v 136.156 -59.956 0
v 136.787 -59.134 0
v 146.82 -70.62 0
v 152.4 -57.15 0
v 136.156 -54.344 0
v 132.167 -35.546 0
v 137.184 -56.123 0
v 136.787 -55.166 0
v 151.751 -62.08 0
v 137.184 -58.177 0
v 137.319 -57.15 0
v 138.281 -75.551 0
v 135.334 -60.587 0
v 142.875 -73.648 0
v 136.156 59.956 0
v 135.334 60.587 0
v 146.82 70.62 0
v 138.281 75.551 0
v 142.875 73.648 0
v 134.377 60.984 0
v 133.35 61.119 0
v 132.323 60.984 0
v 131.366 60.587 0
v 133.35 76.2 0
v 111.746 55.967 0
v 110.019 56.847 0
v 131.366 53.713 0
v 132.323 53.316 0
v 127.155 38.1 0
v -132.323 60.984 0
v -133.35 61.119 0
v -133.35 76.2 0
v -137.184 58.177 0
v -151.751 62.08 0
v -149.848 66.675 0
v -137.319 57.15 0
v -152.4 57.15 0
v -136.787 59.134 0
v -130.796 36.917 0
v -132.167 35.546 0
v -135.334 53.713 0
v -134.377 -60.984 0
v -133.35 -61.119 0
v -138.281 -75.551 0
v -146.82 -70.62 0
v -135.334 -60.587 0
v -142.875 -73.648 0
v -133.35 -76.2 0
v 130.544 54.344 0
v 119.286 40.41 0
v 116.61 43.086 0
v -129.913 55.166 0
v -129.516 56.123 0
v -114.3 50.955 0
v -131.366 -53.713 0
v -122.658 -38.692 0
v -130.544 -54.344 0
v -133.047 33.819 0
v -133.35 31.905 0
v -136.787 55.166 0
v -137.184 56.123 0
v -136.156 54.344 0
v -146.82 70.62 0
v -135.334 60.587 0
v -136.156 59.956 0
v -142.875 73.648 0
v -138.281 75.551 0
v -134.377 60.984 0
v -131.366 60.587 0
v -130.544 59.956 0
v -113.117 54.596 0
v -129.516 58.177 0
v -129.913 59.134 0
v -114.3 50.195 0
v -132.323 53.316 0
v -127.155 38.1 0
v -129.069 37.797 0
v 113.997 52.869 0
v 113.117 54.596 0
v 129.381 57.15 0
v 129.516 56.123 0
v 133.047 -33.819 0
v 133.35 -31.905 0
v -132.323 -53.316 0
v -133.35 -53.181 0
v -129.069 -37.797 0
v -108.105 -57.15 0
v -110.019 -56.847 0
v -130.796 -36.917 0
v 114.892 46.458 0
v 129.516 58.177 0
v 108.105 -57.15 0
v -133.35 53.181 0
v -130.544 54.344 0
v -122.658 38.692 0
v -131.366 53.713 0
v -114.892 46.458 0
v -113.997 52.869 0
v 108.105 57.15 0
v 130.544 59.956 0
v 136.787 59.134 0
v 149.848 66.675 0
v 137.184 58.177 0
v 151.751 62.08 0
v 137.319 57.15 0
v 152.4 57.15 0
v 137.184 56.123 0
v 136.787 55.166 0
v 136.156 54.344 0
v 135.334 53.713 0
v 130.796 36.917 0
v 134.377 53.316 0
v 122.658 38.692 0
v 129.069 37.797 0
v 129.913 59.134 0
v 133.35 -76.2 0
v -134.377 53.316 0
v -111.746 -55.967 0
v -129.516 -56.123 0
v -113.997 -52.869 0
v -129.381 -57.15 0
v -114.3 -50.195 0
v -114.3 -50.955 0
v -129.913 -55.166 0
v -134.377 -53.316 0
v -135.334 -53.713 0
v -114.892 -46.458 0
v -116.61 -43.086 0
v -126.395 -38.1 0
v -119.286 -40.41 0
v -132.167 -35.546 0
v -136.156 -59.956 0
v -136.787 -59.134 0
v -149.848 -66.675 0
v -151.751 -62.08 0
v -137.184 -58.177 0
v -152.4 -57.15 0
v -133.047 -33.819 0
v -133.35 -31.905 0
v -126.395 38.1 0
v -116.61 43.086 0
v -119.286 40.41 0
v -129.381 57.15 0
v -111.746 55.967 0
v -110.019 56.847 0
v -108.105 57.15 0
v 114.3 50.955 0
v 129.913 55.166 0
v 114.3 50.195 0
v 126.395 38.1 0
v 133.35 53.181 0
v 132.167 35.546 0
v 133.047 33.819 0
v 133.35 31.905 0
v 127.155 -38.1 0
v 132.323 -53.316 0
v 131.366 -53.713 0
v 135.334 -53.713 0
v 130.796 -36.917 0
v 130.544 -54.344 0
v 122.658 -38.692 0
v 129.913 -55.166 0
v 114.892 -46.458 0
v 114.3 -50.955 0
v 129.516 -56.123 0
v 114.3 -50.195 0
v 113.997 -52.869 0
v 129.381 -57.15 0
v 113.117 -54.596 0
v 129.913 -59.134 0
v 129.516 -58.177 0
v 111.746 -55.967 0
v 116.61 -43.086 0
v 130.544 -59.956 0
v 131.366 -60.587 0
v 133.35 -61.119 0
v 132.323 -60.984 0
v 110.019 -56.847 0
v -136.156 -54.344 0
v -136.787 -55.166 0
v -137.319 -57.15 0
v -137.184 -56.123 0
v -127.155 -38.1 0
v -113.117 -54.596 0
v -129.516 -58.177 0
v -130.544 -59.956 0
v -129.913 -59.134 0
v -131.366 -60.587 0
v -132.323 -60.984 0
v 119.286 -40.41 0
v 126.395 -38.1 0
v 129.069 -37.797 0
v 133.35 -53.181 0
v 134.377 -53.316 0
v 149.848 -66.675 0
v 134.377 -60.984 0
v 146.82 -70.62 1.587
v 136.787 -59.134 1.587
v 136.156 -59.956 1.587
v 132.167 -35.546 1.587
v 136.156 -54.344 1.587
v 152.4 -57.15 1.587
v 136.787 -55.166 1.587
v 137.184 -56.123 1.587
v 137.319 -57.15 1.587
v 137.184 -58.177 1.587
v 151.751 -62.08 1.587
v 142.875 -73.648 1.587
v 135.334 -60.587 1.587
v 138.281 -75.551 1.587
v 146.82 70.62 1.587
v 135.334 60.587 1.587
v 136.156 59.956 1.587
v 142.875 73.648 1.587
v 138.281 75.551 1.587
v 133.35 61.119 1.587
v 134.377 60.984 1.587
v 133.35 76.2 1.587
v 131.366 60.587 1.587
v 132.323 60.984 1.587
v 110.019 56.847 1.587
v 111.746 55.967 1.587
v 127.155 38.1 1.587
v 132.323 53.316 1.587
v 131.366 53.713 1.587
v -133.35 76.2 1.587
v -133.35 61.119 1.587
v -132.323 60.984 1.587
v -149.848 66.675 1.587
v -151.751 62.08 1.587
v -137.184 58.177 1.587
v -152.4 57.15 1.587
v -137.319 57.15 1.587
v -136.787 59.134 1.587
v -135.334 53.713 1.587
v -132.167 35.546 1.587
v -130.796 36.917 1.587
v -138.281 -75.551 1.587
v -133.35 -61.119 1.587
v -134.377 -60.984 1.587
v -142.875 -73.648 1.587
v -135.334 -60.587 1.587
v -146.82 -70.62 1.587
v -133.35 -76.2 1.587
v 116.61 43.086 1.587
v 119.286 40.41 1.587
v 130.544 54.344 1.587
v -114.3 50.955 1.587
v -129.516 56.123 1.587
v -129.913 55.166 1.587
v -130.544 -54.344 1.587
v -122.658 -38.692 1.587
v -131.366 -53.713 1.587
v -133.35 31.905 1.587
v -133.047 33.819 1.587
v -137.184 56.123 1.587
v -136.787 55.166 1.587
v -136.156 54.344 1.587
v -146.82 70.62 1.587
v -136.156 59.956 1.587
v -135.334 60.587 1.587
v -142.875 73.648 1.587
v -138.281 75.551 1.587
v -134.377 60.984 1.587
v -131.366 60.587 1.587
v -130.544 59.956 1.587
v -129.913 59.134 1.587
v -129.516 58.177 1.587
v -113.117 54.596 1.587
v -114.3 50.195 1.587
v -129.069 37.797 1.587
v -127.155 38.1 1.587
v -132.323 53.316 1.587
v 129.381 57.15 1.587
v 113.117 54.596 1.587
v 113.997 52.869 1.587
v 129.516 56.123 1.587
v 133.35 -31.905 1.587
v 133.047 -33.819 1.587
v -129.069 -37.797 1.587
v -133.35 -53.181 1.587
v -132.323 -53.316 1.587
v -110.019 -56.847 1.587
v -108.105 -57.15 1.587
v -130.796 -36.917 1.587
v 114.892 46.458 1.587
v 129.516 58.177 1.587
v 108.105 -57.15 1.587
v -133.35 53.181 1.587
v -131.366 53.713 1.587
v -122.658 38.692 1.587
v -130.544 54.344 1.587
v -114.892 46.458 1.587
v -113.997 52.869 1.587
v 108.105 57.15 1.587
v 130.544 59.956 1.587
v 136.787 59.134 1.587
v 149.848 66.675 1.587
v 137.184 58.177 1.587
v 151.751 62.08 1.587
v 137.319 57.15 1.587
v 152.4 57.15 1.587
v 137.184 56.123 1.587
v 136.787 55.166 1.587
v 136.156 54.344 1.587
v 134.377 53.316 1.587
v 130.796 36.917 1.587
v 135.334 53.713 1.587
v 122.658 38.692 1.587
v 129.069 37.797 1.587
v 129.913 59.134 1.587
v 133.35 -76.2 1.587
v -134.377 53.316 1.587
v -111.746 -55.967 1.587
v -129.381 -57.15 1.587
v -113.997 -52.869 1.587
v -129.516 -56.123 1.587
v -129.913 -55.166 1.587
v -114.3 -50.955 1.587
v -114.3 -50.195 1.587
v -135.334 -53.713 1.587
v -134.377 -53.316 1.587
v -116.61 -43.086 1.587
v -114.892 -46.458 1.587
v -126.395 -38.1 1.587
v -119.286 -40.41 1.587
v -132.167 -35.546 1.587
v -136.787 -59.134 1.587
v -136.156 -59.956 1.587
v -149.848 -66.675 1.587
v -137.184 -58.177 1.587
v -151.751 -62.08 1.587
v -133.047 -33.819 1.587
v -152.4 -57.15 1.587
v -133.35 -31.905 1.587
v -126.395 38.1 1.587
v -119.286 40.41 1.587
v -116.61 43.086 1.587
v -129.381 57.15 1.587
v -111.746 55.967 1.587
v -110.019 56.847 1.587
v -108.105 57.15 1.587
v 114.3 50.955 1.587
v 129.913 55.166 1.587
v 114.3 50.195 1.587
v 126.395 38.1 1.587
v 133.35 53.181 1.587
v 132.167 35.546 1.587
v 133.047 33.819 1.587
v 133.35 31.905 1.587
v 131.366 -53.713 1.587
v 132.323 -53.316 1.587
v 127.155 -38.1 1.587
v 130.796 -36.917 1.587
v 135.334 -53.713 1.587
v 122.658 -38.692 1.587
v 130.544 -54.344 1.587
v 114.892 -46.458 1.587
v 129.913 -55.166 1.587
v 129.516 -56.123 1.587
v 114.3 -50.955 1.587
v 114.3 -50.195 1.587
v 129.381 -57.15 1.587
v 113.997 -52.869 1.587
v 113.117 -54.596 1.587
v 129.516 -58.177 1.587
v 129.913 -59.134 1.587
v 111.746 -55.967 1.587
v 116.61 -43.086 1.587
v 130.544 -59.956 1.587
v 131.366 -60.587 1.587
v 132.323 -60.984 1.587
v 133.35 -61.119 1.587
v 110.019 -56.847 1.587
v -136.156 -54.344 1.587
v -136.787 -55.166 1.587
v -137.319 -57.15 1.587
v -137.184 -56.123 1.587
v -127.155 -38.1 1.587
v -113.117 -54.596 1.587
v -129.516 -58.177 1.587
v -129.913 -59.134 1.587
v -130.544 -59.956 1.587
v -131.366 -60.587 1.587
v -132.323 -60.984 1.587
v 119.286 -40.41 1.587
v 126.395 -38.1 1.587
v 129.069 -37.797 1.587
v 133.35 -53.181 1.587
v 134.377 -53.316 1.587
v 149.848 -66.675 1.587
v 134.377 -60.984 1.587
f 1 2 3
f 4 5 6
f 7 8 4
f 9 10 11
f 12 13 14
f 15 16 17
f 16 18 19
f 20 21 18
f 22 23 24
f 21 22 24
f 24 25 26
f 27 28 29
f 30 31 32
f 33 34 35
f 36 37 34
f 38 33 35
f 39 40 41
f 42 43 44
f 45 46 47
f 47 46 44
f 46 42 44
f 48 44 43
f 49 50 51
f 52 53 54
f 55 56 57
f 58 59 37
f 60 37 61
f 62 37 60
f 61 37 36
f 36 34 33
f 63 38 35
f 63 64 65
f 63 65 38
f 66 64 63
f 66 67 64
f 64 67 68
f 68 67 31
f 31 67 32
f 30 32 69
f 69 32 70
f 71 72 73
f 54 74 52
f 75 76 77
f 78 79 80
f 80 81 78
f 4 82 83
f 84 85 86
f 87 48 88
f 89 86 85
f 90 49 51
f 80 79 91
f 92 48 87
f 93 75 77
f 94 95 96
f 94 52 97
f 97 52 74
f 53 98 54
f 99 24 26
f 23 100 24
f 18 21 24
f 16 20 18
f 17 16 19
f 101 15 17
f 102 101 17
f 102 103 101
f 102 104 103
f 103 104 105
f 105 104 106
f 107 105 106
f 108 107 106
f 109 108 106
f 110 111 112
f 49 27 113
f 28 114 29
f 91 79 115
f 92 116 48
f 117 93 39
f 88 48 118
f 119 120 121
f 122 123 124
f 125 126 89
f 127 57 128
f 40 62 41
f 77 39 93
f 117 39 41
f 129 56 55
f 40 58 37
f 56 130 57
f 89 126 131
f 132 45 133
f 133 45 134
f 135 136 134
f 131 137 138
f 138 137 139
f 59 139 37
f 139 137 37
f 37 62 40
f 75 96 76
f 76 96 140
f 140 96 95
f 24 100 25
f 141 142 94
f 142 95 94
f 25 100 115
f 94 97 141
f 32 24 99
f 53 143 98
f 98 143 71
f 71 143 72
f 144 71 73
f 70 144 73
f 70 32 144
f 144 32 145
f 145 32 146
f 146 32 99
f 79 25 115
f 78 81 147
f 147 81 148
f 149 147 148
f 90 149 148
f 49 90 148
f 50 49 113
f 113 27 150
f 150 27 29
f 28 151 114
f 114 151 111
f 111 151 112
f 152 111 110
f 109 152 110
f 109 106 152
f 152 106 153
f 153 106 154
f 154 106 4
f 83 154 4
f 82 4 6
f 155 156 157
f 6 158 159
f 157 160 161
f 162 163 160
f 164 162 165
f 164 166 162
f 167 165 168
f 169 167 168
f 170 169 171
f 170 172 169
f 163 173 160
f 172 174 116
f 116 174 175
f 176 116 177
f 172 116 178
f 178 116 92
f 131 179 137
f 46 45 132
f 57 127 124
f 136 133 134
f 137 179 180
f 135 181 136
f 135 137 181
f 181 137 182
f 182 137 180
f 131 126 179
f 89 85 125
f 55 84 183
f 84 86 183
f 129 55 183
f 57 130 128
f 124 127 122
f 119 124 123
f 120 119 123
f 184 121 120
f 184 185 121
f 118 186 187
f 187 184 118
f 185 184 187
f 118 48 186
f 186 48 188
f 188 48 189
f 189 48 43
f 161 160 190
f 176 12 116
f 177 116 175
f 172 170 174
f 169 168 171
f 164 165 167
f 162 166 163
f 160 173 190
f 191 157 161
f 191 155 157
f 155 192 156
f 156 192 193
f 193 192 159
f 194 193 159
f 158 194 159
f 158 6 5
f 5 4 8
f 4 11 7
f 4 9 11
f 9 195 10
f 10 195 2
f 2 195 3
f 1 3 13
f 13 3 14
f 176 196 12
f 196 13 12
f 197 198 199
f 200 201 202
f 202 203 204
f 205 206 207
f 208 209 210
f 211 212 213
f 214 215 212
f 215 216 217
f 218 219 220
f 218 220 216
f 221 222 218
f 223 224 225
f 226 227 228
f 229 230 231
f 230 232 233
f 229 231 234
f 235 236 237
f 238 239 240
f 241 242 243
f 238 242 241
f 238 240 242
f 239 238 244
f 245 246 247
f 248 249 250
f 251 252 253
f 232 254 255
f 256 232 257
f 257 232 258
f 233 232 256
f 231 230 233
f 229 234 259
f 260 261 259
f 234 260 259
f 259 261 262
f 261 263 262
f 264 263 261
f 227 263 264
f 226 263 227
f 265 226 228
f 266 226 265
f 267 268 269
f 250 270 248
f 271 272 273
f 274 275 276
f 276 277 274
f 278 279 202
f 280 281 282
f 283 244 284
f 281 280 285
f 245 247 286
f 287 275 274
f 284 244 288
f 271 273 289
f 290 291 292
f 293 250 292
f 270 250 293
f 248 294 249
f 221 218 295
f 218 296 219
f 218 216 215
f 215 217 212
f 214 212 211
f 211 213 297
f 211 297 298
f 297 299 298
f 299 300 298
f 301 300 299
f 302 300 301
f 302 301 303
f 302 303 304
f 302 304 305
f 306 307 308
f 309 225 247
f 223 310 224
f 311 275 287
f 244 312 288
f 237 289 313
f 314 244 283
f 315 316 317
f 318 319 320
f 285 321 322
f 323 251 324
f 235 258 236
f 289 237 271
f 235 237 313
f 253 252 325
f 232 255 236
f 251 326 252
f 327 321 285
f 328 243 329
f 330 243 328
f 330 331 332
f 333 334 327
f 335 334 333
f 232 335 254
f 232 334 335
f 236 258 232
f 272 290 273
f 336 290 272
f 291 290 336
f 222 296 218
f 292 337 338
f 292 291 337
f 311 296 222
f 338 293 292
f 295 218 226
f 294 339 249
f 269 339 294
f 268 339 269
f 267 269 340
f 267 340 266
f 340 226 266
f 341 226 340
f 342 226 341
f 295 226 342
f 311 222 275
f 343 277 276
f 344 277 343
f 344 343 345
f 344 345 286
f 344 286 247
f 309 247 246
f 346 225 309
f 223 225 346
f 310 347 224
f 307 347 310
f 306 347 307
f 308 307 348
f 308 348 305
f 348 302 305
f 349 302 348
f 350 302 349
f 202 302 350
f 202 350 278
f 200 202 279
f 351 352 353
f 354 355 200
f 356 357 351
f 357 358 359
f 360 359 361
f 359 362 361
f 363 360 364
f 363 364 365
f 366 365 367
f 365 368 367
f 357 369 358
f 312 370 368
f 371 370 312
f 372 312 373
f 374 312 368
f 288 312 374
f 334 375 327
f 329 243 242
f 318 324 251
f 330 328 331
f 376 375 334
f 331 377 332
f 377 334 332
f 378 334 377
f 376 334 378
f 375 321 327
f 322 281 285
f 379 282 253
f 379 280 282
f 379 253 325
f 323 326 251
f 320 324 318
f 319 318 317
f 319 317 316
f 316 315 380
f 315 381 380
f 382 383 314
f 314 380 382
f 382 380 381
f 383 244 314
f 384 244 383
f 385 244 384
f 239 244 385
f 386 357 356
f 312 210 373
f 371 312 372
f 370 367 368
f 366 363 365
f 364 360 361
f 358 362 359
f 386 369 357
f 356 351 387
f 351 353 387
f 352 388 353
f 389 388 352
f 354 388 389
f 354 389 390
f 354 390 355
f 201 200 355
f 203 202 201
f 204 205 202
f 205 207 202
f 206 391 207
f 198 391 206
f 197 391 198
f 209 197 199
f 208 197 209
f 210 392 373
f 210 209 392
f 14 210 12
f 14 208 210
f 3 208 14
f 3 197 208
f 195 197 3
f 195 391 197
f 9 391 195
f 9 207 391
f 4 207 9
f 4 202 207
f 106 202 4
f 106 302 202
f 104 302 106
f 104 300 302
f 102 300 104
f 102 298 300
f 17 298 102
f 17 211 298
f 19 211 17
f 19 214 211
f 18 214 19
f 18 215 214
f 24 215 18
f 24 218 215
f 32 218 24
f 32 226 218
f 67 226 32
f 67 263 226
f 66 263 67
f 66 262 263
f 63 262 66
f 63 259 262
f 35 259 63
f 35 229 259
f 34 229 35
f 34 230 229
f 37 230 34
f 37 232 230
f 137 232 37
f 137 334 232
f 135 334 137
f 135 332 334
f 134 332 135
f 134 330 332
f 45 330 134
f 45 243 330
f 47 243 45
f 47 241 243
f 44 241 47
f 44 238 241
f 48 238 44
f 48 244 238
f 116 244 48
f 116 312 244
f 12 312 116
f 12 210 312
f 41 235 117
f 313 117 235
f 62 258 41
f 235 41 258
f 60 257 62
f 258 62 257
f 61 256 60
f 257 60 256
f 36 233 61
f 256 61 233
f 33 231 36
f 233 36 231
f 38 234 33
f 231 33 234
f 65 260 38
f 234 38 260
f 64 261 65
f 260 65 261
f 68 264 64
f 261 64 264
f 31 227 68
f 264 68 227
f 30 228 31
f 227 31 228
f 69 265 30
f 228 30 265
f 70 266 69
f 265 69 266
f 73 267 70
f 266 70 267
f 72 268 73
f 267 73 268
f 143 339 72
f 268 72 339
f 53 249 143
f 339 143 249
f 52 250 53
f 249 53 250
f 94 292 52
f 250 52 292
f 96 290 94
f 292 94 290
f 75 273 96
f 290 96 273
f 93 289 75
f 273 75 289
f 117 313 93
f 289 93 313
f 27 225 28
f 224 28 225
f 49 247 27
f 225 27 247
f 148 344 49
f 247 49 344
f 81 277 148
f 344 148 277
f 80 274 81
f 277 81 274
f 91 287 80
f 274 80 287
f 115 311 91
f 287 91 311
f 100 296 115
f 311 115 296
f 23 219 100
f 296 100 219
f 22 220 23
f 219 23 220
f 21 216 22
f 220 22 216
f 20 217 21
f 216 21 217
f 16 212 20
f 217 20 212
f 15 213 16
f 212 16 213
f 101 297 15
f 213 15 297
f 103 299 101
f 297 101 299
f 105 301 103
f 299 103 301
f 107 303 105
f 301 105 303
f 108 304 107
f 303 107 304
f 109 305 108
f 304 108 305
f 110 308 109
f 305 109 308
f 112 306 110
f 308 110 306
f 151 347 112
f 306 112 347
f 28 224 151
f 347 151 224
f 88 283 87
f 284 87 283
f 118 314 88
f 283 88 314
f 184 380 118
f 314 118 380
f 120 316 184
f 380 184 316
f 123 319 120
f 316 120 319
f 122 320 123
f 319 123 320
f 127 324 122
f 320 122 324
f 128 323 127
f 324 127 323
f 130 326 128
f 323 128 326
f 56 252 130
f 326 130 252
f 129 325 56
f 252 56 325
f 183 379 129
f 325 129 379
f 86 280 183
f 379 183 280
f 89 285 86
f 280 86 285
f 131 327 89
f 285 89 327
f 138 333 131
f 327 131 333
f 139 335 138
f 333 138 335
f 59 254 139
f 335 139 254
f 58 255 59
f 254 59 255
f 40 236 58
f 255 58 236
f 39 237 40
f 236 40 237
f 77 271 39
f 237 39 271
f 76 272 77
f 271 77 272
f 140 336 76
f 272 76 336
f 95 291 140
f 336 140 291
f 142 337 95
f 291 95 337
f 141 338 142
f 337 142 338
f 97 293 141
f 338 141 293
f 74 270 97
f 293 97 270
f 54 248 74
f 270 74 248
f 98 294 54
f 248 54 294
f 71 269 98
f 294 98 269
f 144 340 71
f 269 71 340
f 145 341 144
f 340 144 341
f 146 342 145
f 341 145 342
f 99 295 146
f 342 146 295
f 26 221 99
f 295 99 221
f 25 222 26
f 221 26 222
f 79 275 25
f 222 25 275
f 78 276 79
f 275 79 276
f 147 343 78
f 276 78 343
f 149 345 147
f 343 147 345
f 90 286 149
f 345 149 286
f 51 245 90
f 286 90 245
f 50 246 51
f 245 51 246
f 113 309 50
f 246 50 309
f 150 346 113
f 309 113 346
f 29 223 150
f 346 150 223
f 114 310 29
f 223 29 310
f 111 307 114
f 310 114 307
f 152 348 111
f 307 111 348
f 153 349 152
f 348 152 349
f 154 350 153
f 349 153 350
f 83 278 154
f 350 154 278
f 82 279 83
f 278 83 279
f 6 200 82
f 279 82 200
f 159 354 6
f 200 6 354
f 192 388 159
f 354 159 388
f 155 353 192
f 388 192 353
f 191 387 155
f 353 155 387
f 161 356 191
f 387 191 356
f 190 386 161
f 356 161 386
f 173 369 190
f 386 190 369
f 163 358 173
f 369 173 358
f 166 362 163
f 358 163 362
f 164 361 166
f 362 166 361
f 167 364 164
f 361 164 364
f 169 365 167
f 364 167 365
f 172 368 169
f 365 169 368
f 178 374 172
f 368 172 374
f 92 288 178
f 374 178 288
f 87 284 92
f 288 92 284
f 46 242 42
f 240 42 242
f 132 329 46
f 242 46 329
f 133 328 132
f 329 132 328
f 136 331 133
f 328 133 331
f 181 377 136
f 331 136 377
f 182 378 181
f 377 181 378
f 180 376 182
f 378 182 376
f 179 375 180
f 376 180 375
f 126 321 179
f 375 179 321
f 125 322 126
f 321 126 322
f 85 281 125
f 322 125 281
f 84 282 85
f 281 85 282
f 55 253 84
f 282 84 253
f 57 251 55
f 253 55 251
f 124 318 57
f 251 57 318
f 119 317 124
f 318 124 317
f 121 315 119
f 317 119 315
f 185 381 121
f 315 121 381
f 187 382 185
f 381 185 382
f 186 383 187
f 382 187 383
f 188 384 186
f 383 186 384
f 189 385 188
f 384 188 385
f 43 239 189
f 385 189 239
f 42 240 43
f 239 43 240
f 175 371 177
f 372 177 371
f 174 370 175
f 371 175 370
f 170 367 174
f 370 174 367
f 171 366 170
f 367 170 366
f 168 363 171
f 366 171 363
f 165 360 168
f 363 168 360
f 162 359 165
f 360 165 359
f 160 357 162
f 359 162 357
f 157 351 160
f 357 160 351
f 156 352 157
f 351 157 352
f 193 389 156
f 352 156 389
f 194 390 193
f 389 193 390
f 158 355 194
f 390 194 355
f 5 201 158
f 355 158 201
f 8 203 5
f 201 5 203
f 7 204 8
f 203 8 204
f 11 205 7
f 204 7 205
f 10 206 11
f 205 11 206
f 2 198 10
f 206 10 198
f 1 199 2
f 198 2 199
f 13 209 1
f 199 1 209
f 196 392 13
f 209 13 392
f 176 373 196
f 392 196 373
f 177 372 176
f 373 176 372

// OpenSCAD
// file: ../lib/TOGComplexLib1.scad
function tcplx1_multiply(a, b) =
	[a[0]*b[0] - a[1]*b[1], a[0]*b[1] + a[1]*b[0]];
function tcplx1_divide(a, b) =
	let(bot = (b[0]*b[0] + b[1]*b[1]))
	[
		(a[0]*b[0] + a[1]*b[1])/bot,
		(a[1]*b[0] - a[0]*b[1])/bot
	];

assert([-11,23] == tcplx1_multiply([3,2], [1,7]));

assert([-1,3] == tcplx1_multiply([3,1], [0,1]));
assert([-1,3] == tcplx1_multiply([0,1], [3,1]));

echo(tcplx1_divide([-1,3], [3,1]));
assert([0,1] == tcplx1_divide([-1,3], [3,1]));

function tcplx1_normalize(vec) =
	let(veclen = sqrt(vec[0]*vec[0]+vec[1]*vec[1]))
	[vec[0] / veclen, vec[1] / veclen];

function tcplx1_relative_turnvec_vv(v0, v1) =
	tcplx1_divide(tcplx1_normalize(v1), tcplx1_normalize(v0));

function tcplx1_relative_turnvec_abc(p0, p1, p2) = tcplx1_relative_turnvec_vv(p1-p0, p2-p1);

// A 90-degree turn
assert([0,1] == tcplx1_relative_turnvec_abc([0,0], [1,0], [1,1]));
assert([0,1] == tcplx1_relative_turnvec_abc([0,0], [0,1], [-1,1]));

// A 45-degree turn
assert(tcplx1_normalize([1,1]) == tcplx1_relative_turnvec_abc([0,0], [1,0], [ 2,1]));
assert(tcplx1_normalize([1,1]) == tcplx1_relative_turnvec_abc([0,0], [0,1], [-1,2]));


function tcplx1_relative_angle_abc(p0, p1, p2) =
	let(turnvec = tcplx1_relative_turnvec_abc(p0, p1, p2))
	atan2(turnvec[1], turnvec[0]);

assert(-135 == tcplx1_relative_angle_abc([0,0], [1,0], [0,-1]));
assert( -90 == tcplx1_relative_angle_abc([0,0], [1,0], [1,-1]));
assert(   0 == tcplx1_relative_angle_abc([0,0], [1,0], [2, 0]));
assert(  90 == tcplx1_relative_angle_abc([0,0], [1,0], [1, 1]));
assert( 135 == tcplx1_relative_angle_abc([0,0], [1,0], [0, 1]));

assert(  90 == tcplx1_relative_angle_abc([1,1], [3,3], [1, 5]));
// file: ../lib/TOGArrayLib1.scad
// TOGArrayLib1.5
// 
// Functions for working with arrays.
// 
// v1.1:
// - tal1_reduce assert(is_list(items)) to prevent infinite recursion
//   when given undefined or other non-list values
// v1.1.1:
// - Fix tal1_uniq_remap_v2 to return "list-remap-result" as the
//   first element of the returned list
// v1.2:
// - Add tal1_replace_at function
// v1.3:
// - tal1_is_vec_of, tal1_is_vec_of_num
// v1.4:
// - tal1_assert_for_each, for when you want to assert something
//   about each of a list of items and get nice failure messages
// v1.5:
// - Add tal1_duplicate_reversed function, which may be
//   handy when generating symmetrical polygons and stuff.

/**
 * Make a list with the contents of list `a`,
 * but starting at offset `off`, replaced by the contents of list `b`.
 * len(result) = max(len(a), off+len(b))
 */
function tal1_replace_at(a, off, b, default_value=undef, default_value_function=undef) =
	assert(is_list(a))
	assert(is_list(b))
	let( _dvf = !is_undef(default_value_function) ? default_value_function : function(i) default_value )
[
	for( i=[0:1:min(off,len(a))-1] ) a[i],
	for( i=[len(a):1:off-1] ) _dvf(i),
	for( i=[off:1:off+len(b)-1] ) b[i-off],
	for( i=[off+len(b):1:len(a)-1] ) a[i],
];

// Simplest case
assert([] == tal1_replace_at([], 0, []));
// Second simplest cases
assert(["foo"] == tal1_replace_at(["foo"], 0, []));
assert(["foo"] == tal1_replace_at([], 0, ["foo"]));
// Replace one item
assert(["foo","quux","baz"] == tal1_replace_at(["foo","bar","baz"], 1, ["quux"]));
// Replace and extend
assert(["foo","quux","tuna","tina"] == tal1_replace_at(["foo","bar","baz"], 1, ["quux", "tuna", "tina"]));
// Add beyond end of `a`
assert(["foo","zzz","quux"] == tal1_replace_at(["foo"], 2, ["quux"], default_value="zzz"));
// Adding 'nothing' should still fill to that point with defaults
assert(["foo","zzz","zzz"] == tal1_replace_at(["foo"], 3, [], default_value="zzz"));


function tal1_reduce(start, items, func, offset=0) =
	assert(is_list(items))
	len(items) == offset ? start :
	tal1_reduce(func(start, items[offset]), items, func, offset+1);

function tal1_consecutive_duplicate_count(items) = tal1_reduce(
	[0, undef],
	items,
	function(z,item) [z[0] + (item == z[1] ? 1 : 0), item]
)[0];

assert(0 == tal1_consecutive_duplicate_count([]));
assert(0 == tal1_consecutive_duplicate_count([50]));
assert(1 == tal1_consecutive_duplicate_count([50,50]));
assert(0 == tal1_consecutive_duplicate_count([50,51,52,53]));
assert(1 == tal1_consecutive_duplicate_count([50,51,52,52]));
assert(3 == tal1_consecutive_duplicate_count([50,50,50,50]));

// Set test_size to arbirarily large values
// to ensure that OpenSCAD can handle heavy recursion
let(test_size=1000) assert(test_size/2 == tal1_consecutive_duplicate_count([for(i=[0:1:test_size-1]) floor(i/2)]));



function tal1_uniq_(items, off0, off1) =
	let(chunklen = off1-off0)
	chunklen == 0 ? [] :
	chunklen == 1 ? [items[off0]] :
	let(half=floor(chunklen/2))
	let(left  = tal1_uniq_(items, off0     , off0+half))
	let(right = tal1_uniq_(items, off0+half, off1     ))
	assert(len(left) > 0)
	assert(len(right) > 0)
	left[len(left)-1] == right[0] ? [each left, for(i=[1:1:len(right)-1]) right[i]] :
	[each left, each right];

/** Given a list of items, returns a new list with identical consecutive items merged */
function tal1_uniq(items) = tal1_uniq_(items, 0, len(items));

assert([] == tal1_uniq([]));
assert([123] == tal1_uniq([123]));
assert([55,0,1,2,3] == tal1_uniq([55,0,1,2,3]));
assert([55,0,1,2] == tal1_uniq([55,0,1,1,2]));
assert([55,0,1] == tal1_uniq([55,55,0,0,0,0,0,0,1,1,1,1]));
assert([55,0] == tal1_uniq([55,0,0,0,0,0,0,0]));



/**
 * Returns [new items, old index -> new index mapping].
 * No-op version.
 */
function tal1_uniq_remap_v1(items) =
	["list-remap-result", items, [for (vi=[0:1:len(items)-1]) vi]];

// [a, a, b, b, c, c]
//
// [a,    ...], []  -> [a],[0]
// [a, a, ...], [0] -> [a],[0,0]

assert([1,2,3] == [1,2,3]);

/**
 * Recursive version that will combine adjacent identical vertexes,
 * but will use the original items.
 */
function tal1_uniq_remap_v2(items, map=[]) =
	let(index = len(map))
	len(items) == index ? ["list-remap-result", items, map] :
	index == 0 ? tal1_uniq_remap_v2(items, [0]) :
	items[index] == items[map[index-1]] ? tal1_uniq_remap_v2(items, [for(vi=map) vi, map[index-1]]) :
	tal1_uniq_remap_v2(items, [for(vi=map) vi, index]);

assert(tal1_uniq_remap_v2([1,1,2,2,3,4]) == ["list-remap-result", [1,1,2,2,3,4], [0,0,2,2,4,5]]);


/**
 * Returns true if `vec` is a list of at least min_len items
 * and component_check(each item, even those beyond min_len) is true.
 */
function tal1_is_vec_of(vec, min_len=0, component_check=function(x) true) =
	assert(is_num(min_len) && min_len >= 0)
	assert(is_function(component_check))
	is_list(vec) && len(vec) >= min_len &&
	tal1_reduce(true, vec, function(prev,item) prev && component_check(item));

function tal1_is_vec_of_num(vec, min_len=0) = tal1_is_vec_of(vec, min_len, function(i) is_num(i));

assert( true == tal1_is_vec_of_num([1,2,3]));
assert( true == tal1_is_vec_of_num([]));
assert( true == tal1_is_vec_of_num([1,2,3], 3));
assert(false == tal1_is_vec_of_num([1,2], 3));
assert(false == tal1_is_vec_of_num([1,2,"spoon"], 3));
// Requirements are ambiguous when
// first min_len items are numbers, but there are non-numeric items afterwards,
// so let's error on the side of saying 'no, it's not a list of numbers';
// i.e. the item check and the min_len are independent.
assert(false == tal1_is_vec_of_num([1,2,3,"artichoke"], 3));


/**
 * Asserts that item_checker(each item in list, index of item)[0] is true.
 * Second element of item_checker return value is assertion message.
 * Returns the original list, in case that's useful to you.
 */
function tal1_assert_for_each(list, item_checker) =
	let( _ignored = [ for(i=[0:1:len(list)-1])
		let(q=item_checker(list[i],i))
		let(passed=is_bool(q) ? q : is_list(q) ? q[0] : assert(false, str(
			"tal1_assert_for_each: item_checker should return Bool|[Bool,String], but returned ",
			q, " for item at index ", i)))
		let(message=is_list(q) ? q[1] : undef)
		assert(passed, message)
		q
	])
	list;

// Callback can return a boolean...
assert([1,2,3] == tal1_assert_for_each([1,2,3], function(v,i) is_num(v)));
// ...or a [boolean, string]
assert([1,2,3] == tal1_assert_for_each([1,2,3], function(v,i) [is_num(v), "element be a num"]));

// [a, b, c] -> [a, b, c, rxf(c), rxf(b), rxf(a)]
function tal1_duplicate_reversed(list, rxf=function(item) item) =
	[
		each list,
		for( i=[len(list)-1 : -1 : 0] ) rxf(list[i]),
	];
// file: ../lib/TOGMod1Constructors.scad
// TOGMod1Constructors-v1.11
// 
// Functions to construct objects understood by TOGMod1
// 
// v1.1:
// - Add togmod1_make_rounded_rect
// v1.2:
// - togmod1_make_rounded_rect can make ovals
// v1.3:
// - togmod1_circle_points, to just get the points of a circle
// - if pos parameter to circle function has a third element,
//   returned vertexes will include it as the z component;
// v1.3.1
// - Some assertions
// v1.4:
// - Refactor togmod1_rounded_rect_points and togmod1_circle_points
//   to use togmod1__make_nd_vector_adder for adapting to whatever
//   `pos` parameter is.
// v1.5:
// - togmod_rounded_rect_points will not simplify completely rounded sides
//   (where length of side is exactly twice the rounding radius)
//   unless simplify_rounded_sides=true
//   - This makes it more useful for polyhedron generation,
//     where radius varies, but number of points must remain constant.
// v1.6:
// - togmod1_make_rect makes a simple rectangle
// - togmod1_make_rounded_rect will defer to togmod1_make_rect when r=0
// v1.7:
// - togmod1_make_circle will return empty shape (["union"]) when d=0
// v1.8:
// - Add togmod1_text
// v1.9:
// - togmod1_circle_points uses 3 as minimum circle point count instead of 6
// v1.10:
// - Fix togmod1_linear_extrude_y so that range corresponds to Y start/end and
//   polygon X,Y correspond to X,Z.  Previously it was rotated wrongly,
//   which would have gone unnoticed for symmetrical shapes centered at 0,0.
// v1.11:
// - Remove an 'echo'

use <./TOGArrayLib1.scad>

function togmod1__make_nd_vector_adder(origin=[0,0]) =
	let(origin_is_zero = tal1_reduce(true, origin, function(prev,item) prev && item == 0))
	origin_is_zero ? (function(vec) len(vec) >= len(origin) ? vec : tal1_replace_at(origin, 0, vec)) :
	function(vec) [
		for(i=[0:1:max(len(origin),len(vec))-1]) (len(vec) > i ? vec[i] : 0) + (len(origin) > i ? origin[i] : 0),
	];

assert([1,2,3] == togmod1__make_nd_vector_adder()([1,2,3]));
assert([1,2,3] == togmod1__make_nd_vector_adder([0,0,3])([1,2]));


function togmod1_make_cuboid(size) =
	assert(is_list(size))
	assert(len(size) >= 3)
	assert(is_num(size[0]))
	assert(is_num(size[1]))
	assert(is_num(size[2]))
	["polyhedron-vf", [
		[-size[0]/2, -size[1]/2, -size[2]/2],
		[+size[0]/2, -size[1]/2, -size[2]/2],
		[-size[0]/2, +size[1]/2, -size[2]/2],
		[+size[0]/2, +size[1]/2, -size[2]/2],
		[-size[0]/2, -size[1]/2, +size[2]/2],
		[+size[0]/2, -size[1]/2, +size[2]/2],
		[-size[0]/2, +size[1]/2, +size[2]/2],
		[+size[0]/2, +size[1]/2, +size[2]/2]
	], [
		[0,1,3,2],[0,4,5,1],[4,6,7,5],[3,7,6,2],[1,5,7,3],[6,4,0,2]
	]];

function togmod1_make_polygon(verts) =
	["polygon-vp", verts, [[for( i=[0:1:len(verts)-1] ) i%len(verts)]]];

function togmod1_rounded_rect_points(size, r, pos=[0,0], simplify_rounded_sides=false) =
	assert(is_list(size))
	assert(len(size) >= 2)
	let(radii = is_list(r) ? r : is_num(r) ? [r,r] : assert(false, "rounded_rect r(adius) should be list<num> or num"))
	let(rx = radii[0])
	let(ry = radii[1])
	assert(is_num(rx))
	assert(is_num(ry))
	assert(size[0] >= 2*rx, str("size[0] must be >= 2*r[0]; size[0] = ",size[0],", 2*r[0] = ",2*rx))
	assert(size[1] >= 2*ry, str("size[1] must be >= 2*r[1]; size[1] = ",size[1],", 2*r[1] = ",2*ry))
	let(quarterfn=max($fn/4, 1))
	let(qfnx = simplify_rounded_sides && size[0] == 2*rx ? quarterfn-1 : quarterfn)
	let(qfny = simplify_rounded_sides && size[1] == 2*ry ? quarterfn-1 : quarterfn)
	let(finalizepos = togmod1__make_nd_vector_adder(pos))
[
	for(a=[0 : 1 : qfnx]) let(ang=      a*90/quarterfn) finalizepos([ size[0]/2-rx + rx*cos(ang),  size[1]/2-ry + ry*sin(ang)]),
	for(a=[0 : 1 : qfny]) let(ang= 90 + a*90/quarterfn) finalizepos([-size[0]/2+rx + rx*cos(ang),  size[1]/2-ry + ry*sin(ang)]),
	for(a=[0 : 1 : qfnx]) let(ang=180 + a*90/quarterfn) finalizepos([-size[0]/2+rx + rx*cos(ang), -size[1]/2+ry + ry*sin(ang)]),
	for(a=[0 : 1 : qfny]) let(ang=270 + a*90/quarterfn) finalizepos([ size[0]/2-rx + rx*cos(ang), -size[1]/2+ry + ry*sin(ang)]),
];

function togmod1_make_rect(size) =
	togmod1_make_polygon([
		[-size[0]/2, -size[1]/2],
		[+size[0]/2, -size[1]/2],
		[+size[0]/2, +size[1]/2],
		[-size[0]/2, +size[1]/2],
	]);

function togmod1_make_rounded_rect(size, r) =
	r == 0 ? togmod1_make_rect(size) :
	togmod1_make_polygon(togmod1_rounded_rect_points(size,r,simplify_rounded_sides=true));

/**
 * Returns points for an approximation of a circle where points are at distance r from pos.
 * Can be used to make other regular polygons, but the faces will be less than that
 * distance from pos (do some trig if you want face distance, e.g. for a hex nut).
 */
function togmod1_circle_points(r, pos=[0,0], d=undef) =
	assert( !is_undef(r) || !is_undef(d) )
	assert(!is_undef(pos[0]))
	assert(!is_undef(pos[1]))
	let(finalizepos = togmod1__make_nd_vector_adder(pos))
	let(r_ = !is_undef(r) ? r : d/2)
	let(fn = max($fn, 3))
	[for(i=[0 : 1 : fn-1]) finalizepos([r_*cos(i*360/fn), r_*sin(i*360/fn)])];

function togmod1_make_circle(r, pos=[0,0], d=undef) =
	r == 0 || d == 0 ? ["union"] :
	togmod1_make_polygon(togmod1_circle_points(r=r, pos=pos, d=d));

function togmod1_make_cylinder(d, zrange=[0,1], r=undef, pos=[0,0]) =
	assert( !is_undef(r) || !is_undef(d) )
	let( r_ = !is_undef(r) ? r : d/2 )
	// TODO: Make polyhedron directly
	["linear-extrude-zs", zrange, togmod1_make_circle(r=r_, pos=pos)];

function togmod1__is_range1d(range) = is_list(range) && len(range) == 2 && is_num(range[0]) && is_num(range[1]);

function togmod1_linear_extrude_z(range, shape) =
	assert(togmod1__is_range1d(range))
	["linear-extrude-zs", range, shape];
function togmod1_linear_extrude_x(range, shape) =
	assert(togmod1__is_range1d(range))
	["rotate", [90, 0, 90], togmod1_linear_extrude_z(range, shape)];
function togmod1_linear_extrude_y(range, shape) =
	assert(togmod1__is_range1d(range))
	["rotate", [90, 0,  0], togmod1_linear_extrude_z([-range[1], -range[0]], shape)];

function togmod1_text(text, size, font, halign, valign, spacing, direction, language, script) =
	["text-tsfhvsdls", text, size, font, halign, valign, spacing, direction, language, script];
// file: ../lib/TOGMod1.scad
// TOGMod1.9
// OpenSCAD library for representing shapes
// 
// See also: Functional OpenSCAD (https://github.com/thehans/FunctionalOpenSCAD)
// 
// v1.8:
// - Add `text-tsfhvsdls`
// v1.9
// - Add `offset-ds` (offset with _d_elta a _s_hape)

module togmod1_domodule(mod) {
	assert(is_list(mod));
	assert(len(mod) > 0);
	if( mod[0] == "polygon-vp" ) {
		// ["polygon-vp", vertexes, paths]
		polygon(points=mod[1], paths=mod[2]);
	} else if( mod[0] == "polyhedron-vf" ) {
		polyhedron(mod[1], faces=mod[2]);
	} else if( mod[0] == "scale" ) {
		assert(len(mod) == 3);
		scale(mod[1]) togmod1_domodule(mod[2]);
	} else if( mod[0] == "translate" ) {
		assert(len(mod) == 3);
		assert(is_list(mod[1]));
		for(c=mod[1]) assert(is_num(c), "translate component should be numeric");
		translate(mod[1]) togmod1_domodule(mod[2]);
	} else if( mod[0] == "rotate" ) {
		assert(len(mod) == 3);
		rotate(mod[1]) togmod1_domodule(mod[2]);
	} else if( mod[0] == "intersection" ) {
		intersection_for( i=[1:1:len(mod)-1] ) togmod1_domodule(mod[i]);
	} else if( mod[0] == "difference" ) {
		difference() {
			togmod1_domodule(mod[1]);
			for( i=[2:1:len(mod)-1] ) togmod1_domodule(mod[i]);
		}
	} else if( mod[0] == "union" ) {
		for( i=[1:1:len(mod)-1] ) togmod1_domodule(mod[i]);
	} else if( mod[0] == "hull" ) {
		hull() for( i=[1:1:len(mod)-1] ) togmod1_domodule(mod[i]);
	} else if( mod[0] == "offset-rs" ) {
		assert(len(mod) == 3);
		assert(is_num(mod[1]));
		assert(is_list(mod[2]));
		offset(mod[1]) togmod1_domodule(mod[2]);
	} else if( mod[0] == "linear-extrude-zs" ) {
		// ["linear-extrude-zs", [z0,z1], 2d_shape] // centered
		// ["linear-extrude-zs", height, 2d_shape]
		let( zrange = is_list(mod[1]) ? mod[1] : [-mod[1]/2, mod[1]/2] ) {
			translate([0,0,zrange[0]]) linear_extrude(zrange[1]-zrange[0]) togmod1_domodule(mod[2]);
		}
	} else if( mod[0] == "render" ) {
		render() togmod1_domodule(mod[1]);
	} else if( mod[0] == "minkowski" ) {
		minkowski() {
			togmod1_domodule(mod[1]);
			togmod1_domodule(mod[2]);
		}
	} else if( mod[0] == "x-debug" ) {
		# togmod1_domodule(mod[1]);
	} else if( mod[0] == "x-color" ) {
		color(mod[1]) togmod1_domodule(mod[2]);
	} else if( mod[0] == "text-tsfhvsdls" ) {
		text(text=mod[1], size=mod[2], font=mod[3], halign=mod[4], valign=mod[5], spacing=mod[6], direction=mod[7], language=mod[7], script=mod[8]);
	} else if( mod[0] == "offset-ds" ) {
		assert(is_num(mod[1]));
		assert(is_list(mod[2]));
		offset(delta=mod[1]) togmod1_domodule(mod[2]);
	} else {
		assert(false, str("Unrecognized shape: ", mod[0]));
	}
}
// main file
// LEDPanelTemplate1.0
// 
// Template for marking hole and 'keepout zone' on 12"x6" LED panels a la WSITEM-101331

inch = 25.4;
thickness = inch / 16;
$fn = 24;

use <../lib/TOGMod1.scad>
use <../lib/TOGMod1Constructors.scad>
use <../lib/TOGPath1.scad>

togmod1_domodule(togmod1_linear_extrude_z([0, thickness],
	let( hole = togmod1_make_circle(d=5/16*inch) )
	["difference",
		togmod1_make_rounded_rect([12*inch, 6*inch], r=inch*3/4),
		
		let(x0=-6*inch + 3/4*inch, x1=-6*inch + 1.5*inch, x2=6*inch-1.5*inch, x3=6*inch-3/4*inch)
		let(y0=-3*inch + 3/4*inch, y1=-3*inch + 1.5*inch, y2=3*inch-1.5*inch, y3=3*inch-3/4*inch)
		let(cops=[["round", inch/4.1]])
		let(vops=[["round", inch/2.1]])
		togpath1_rath_to_polygon(["togpath1-rath",
			["togpath1-rathnode", [x2,y0], each cops],
			["togpath1-rathnode", [x2,y1], each vops],
			["togpath1-rathnode", [x3,y1], each cops],
			["togpath1-rathnode", [x3,y2], each cops],
			["togpath1-rathnode", [x2,y2], each vops],
			["togpath1-rathnode", [x2,y3], each cops],
			["togpath1-rathnode", [x1,y3], each cops],
			["togpath1-rathnode", [x1,y2], each vops],
			["togpath1-rathnode", [x0,y2], each cops],
			["togpath1-rathnode", [x0,y1], each cops],
			["togpath1-rathnode", [x1,y1], each vops],
			["togpath1-rathnode", [x1,y0], each cops],
	   ]),
		
		for( xm=[-1,1] ) for( ym=[-1,1] ) ["translate", [xm*(6-3/4)*inch, ym*(3-3/4)*inch], hole],
	]
));
